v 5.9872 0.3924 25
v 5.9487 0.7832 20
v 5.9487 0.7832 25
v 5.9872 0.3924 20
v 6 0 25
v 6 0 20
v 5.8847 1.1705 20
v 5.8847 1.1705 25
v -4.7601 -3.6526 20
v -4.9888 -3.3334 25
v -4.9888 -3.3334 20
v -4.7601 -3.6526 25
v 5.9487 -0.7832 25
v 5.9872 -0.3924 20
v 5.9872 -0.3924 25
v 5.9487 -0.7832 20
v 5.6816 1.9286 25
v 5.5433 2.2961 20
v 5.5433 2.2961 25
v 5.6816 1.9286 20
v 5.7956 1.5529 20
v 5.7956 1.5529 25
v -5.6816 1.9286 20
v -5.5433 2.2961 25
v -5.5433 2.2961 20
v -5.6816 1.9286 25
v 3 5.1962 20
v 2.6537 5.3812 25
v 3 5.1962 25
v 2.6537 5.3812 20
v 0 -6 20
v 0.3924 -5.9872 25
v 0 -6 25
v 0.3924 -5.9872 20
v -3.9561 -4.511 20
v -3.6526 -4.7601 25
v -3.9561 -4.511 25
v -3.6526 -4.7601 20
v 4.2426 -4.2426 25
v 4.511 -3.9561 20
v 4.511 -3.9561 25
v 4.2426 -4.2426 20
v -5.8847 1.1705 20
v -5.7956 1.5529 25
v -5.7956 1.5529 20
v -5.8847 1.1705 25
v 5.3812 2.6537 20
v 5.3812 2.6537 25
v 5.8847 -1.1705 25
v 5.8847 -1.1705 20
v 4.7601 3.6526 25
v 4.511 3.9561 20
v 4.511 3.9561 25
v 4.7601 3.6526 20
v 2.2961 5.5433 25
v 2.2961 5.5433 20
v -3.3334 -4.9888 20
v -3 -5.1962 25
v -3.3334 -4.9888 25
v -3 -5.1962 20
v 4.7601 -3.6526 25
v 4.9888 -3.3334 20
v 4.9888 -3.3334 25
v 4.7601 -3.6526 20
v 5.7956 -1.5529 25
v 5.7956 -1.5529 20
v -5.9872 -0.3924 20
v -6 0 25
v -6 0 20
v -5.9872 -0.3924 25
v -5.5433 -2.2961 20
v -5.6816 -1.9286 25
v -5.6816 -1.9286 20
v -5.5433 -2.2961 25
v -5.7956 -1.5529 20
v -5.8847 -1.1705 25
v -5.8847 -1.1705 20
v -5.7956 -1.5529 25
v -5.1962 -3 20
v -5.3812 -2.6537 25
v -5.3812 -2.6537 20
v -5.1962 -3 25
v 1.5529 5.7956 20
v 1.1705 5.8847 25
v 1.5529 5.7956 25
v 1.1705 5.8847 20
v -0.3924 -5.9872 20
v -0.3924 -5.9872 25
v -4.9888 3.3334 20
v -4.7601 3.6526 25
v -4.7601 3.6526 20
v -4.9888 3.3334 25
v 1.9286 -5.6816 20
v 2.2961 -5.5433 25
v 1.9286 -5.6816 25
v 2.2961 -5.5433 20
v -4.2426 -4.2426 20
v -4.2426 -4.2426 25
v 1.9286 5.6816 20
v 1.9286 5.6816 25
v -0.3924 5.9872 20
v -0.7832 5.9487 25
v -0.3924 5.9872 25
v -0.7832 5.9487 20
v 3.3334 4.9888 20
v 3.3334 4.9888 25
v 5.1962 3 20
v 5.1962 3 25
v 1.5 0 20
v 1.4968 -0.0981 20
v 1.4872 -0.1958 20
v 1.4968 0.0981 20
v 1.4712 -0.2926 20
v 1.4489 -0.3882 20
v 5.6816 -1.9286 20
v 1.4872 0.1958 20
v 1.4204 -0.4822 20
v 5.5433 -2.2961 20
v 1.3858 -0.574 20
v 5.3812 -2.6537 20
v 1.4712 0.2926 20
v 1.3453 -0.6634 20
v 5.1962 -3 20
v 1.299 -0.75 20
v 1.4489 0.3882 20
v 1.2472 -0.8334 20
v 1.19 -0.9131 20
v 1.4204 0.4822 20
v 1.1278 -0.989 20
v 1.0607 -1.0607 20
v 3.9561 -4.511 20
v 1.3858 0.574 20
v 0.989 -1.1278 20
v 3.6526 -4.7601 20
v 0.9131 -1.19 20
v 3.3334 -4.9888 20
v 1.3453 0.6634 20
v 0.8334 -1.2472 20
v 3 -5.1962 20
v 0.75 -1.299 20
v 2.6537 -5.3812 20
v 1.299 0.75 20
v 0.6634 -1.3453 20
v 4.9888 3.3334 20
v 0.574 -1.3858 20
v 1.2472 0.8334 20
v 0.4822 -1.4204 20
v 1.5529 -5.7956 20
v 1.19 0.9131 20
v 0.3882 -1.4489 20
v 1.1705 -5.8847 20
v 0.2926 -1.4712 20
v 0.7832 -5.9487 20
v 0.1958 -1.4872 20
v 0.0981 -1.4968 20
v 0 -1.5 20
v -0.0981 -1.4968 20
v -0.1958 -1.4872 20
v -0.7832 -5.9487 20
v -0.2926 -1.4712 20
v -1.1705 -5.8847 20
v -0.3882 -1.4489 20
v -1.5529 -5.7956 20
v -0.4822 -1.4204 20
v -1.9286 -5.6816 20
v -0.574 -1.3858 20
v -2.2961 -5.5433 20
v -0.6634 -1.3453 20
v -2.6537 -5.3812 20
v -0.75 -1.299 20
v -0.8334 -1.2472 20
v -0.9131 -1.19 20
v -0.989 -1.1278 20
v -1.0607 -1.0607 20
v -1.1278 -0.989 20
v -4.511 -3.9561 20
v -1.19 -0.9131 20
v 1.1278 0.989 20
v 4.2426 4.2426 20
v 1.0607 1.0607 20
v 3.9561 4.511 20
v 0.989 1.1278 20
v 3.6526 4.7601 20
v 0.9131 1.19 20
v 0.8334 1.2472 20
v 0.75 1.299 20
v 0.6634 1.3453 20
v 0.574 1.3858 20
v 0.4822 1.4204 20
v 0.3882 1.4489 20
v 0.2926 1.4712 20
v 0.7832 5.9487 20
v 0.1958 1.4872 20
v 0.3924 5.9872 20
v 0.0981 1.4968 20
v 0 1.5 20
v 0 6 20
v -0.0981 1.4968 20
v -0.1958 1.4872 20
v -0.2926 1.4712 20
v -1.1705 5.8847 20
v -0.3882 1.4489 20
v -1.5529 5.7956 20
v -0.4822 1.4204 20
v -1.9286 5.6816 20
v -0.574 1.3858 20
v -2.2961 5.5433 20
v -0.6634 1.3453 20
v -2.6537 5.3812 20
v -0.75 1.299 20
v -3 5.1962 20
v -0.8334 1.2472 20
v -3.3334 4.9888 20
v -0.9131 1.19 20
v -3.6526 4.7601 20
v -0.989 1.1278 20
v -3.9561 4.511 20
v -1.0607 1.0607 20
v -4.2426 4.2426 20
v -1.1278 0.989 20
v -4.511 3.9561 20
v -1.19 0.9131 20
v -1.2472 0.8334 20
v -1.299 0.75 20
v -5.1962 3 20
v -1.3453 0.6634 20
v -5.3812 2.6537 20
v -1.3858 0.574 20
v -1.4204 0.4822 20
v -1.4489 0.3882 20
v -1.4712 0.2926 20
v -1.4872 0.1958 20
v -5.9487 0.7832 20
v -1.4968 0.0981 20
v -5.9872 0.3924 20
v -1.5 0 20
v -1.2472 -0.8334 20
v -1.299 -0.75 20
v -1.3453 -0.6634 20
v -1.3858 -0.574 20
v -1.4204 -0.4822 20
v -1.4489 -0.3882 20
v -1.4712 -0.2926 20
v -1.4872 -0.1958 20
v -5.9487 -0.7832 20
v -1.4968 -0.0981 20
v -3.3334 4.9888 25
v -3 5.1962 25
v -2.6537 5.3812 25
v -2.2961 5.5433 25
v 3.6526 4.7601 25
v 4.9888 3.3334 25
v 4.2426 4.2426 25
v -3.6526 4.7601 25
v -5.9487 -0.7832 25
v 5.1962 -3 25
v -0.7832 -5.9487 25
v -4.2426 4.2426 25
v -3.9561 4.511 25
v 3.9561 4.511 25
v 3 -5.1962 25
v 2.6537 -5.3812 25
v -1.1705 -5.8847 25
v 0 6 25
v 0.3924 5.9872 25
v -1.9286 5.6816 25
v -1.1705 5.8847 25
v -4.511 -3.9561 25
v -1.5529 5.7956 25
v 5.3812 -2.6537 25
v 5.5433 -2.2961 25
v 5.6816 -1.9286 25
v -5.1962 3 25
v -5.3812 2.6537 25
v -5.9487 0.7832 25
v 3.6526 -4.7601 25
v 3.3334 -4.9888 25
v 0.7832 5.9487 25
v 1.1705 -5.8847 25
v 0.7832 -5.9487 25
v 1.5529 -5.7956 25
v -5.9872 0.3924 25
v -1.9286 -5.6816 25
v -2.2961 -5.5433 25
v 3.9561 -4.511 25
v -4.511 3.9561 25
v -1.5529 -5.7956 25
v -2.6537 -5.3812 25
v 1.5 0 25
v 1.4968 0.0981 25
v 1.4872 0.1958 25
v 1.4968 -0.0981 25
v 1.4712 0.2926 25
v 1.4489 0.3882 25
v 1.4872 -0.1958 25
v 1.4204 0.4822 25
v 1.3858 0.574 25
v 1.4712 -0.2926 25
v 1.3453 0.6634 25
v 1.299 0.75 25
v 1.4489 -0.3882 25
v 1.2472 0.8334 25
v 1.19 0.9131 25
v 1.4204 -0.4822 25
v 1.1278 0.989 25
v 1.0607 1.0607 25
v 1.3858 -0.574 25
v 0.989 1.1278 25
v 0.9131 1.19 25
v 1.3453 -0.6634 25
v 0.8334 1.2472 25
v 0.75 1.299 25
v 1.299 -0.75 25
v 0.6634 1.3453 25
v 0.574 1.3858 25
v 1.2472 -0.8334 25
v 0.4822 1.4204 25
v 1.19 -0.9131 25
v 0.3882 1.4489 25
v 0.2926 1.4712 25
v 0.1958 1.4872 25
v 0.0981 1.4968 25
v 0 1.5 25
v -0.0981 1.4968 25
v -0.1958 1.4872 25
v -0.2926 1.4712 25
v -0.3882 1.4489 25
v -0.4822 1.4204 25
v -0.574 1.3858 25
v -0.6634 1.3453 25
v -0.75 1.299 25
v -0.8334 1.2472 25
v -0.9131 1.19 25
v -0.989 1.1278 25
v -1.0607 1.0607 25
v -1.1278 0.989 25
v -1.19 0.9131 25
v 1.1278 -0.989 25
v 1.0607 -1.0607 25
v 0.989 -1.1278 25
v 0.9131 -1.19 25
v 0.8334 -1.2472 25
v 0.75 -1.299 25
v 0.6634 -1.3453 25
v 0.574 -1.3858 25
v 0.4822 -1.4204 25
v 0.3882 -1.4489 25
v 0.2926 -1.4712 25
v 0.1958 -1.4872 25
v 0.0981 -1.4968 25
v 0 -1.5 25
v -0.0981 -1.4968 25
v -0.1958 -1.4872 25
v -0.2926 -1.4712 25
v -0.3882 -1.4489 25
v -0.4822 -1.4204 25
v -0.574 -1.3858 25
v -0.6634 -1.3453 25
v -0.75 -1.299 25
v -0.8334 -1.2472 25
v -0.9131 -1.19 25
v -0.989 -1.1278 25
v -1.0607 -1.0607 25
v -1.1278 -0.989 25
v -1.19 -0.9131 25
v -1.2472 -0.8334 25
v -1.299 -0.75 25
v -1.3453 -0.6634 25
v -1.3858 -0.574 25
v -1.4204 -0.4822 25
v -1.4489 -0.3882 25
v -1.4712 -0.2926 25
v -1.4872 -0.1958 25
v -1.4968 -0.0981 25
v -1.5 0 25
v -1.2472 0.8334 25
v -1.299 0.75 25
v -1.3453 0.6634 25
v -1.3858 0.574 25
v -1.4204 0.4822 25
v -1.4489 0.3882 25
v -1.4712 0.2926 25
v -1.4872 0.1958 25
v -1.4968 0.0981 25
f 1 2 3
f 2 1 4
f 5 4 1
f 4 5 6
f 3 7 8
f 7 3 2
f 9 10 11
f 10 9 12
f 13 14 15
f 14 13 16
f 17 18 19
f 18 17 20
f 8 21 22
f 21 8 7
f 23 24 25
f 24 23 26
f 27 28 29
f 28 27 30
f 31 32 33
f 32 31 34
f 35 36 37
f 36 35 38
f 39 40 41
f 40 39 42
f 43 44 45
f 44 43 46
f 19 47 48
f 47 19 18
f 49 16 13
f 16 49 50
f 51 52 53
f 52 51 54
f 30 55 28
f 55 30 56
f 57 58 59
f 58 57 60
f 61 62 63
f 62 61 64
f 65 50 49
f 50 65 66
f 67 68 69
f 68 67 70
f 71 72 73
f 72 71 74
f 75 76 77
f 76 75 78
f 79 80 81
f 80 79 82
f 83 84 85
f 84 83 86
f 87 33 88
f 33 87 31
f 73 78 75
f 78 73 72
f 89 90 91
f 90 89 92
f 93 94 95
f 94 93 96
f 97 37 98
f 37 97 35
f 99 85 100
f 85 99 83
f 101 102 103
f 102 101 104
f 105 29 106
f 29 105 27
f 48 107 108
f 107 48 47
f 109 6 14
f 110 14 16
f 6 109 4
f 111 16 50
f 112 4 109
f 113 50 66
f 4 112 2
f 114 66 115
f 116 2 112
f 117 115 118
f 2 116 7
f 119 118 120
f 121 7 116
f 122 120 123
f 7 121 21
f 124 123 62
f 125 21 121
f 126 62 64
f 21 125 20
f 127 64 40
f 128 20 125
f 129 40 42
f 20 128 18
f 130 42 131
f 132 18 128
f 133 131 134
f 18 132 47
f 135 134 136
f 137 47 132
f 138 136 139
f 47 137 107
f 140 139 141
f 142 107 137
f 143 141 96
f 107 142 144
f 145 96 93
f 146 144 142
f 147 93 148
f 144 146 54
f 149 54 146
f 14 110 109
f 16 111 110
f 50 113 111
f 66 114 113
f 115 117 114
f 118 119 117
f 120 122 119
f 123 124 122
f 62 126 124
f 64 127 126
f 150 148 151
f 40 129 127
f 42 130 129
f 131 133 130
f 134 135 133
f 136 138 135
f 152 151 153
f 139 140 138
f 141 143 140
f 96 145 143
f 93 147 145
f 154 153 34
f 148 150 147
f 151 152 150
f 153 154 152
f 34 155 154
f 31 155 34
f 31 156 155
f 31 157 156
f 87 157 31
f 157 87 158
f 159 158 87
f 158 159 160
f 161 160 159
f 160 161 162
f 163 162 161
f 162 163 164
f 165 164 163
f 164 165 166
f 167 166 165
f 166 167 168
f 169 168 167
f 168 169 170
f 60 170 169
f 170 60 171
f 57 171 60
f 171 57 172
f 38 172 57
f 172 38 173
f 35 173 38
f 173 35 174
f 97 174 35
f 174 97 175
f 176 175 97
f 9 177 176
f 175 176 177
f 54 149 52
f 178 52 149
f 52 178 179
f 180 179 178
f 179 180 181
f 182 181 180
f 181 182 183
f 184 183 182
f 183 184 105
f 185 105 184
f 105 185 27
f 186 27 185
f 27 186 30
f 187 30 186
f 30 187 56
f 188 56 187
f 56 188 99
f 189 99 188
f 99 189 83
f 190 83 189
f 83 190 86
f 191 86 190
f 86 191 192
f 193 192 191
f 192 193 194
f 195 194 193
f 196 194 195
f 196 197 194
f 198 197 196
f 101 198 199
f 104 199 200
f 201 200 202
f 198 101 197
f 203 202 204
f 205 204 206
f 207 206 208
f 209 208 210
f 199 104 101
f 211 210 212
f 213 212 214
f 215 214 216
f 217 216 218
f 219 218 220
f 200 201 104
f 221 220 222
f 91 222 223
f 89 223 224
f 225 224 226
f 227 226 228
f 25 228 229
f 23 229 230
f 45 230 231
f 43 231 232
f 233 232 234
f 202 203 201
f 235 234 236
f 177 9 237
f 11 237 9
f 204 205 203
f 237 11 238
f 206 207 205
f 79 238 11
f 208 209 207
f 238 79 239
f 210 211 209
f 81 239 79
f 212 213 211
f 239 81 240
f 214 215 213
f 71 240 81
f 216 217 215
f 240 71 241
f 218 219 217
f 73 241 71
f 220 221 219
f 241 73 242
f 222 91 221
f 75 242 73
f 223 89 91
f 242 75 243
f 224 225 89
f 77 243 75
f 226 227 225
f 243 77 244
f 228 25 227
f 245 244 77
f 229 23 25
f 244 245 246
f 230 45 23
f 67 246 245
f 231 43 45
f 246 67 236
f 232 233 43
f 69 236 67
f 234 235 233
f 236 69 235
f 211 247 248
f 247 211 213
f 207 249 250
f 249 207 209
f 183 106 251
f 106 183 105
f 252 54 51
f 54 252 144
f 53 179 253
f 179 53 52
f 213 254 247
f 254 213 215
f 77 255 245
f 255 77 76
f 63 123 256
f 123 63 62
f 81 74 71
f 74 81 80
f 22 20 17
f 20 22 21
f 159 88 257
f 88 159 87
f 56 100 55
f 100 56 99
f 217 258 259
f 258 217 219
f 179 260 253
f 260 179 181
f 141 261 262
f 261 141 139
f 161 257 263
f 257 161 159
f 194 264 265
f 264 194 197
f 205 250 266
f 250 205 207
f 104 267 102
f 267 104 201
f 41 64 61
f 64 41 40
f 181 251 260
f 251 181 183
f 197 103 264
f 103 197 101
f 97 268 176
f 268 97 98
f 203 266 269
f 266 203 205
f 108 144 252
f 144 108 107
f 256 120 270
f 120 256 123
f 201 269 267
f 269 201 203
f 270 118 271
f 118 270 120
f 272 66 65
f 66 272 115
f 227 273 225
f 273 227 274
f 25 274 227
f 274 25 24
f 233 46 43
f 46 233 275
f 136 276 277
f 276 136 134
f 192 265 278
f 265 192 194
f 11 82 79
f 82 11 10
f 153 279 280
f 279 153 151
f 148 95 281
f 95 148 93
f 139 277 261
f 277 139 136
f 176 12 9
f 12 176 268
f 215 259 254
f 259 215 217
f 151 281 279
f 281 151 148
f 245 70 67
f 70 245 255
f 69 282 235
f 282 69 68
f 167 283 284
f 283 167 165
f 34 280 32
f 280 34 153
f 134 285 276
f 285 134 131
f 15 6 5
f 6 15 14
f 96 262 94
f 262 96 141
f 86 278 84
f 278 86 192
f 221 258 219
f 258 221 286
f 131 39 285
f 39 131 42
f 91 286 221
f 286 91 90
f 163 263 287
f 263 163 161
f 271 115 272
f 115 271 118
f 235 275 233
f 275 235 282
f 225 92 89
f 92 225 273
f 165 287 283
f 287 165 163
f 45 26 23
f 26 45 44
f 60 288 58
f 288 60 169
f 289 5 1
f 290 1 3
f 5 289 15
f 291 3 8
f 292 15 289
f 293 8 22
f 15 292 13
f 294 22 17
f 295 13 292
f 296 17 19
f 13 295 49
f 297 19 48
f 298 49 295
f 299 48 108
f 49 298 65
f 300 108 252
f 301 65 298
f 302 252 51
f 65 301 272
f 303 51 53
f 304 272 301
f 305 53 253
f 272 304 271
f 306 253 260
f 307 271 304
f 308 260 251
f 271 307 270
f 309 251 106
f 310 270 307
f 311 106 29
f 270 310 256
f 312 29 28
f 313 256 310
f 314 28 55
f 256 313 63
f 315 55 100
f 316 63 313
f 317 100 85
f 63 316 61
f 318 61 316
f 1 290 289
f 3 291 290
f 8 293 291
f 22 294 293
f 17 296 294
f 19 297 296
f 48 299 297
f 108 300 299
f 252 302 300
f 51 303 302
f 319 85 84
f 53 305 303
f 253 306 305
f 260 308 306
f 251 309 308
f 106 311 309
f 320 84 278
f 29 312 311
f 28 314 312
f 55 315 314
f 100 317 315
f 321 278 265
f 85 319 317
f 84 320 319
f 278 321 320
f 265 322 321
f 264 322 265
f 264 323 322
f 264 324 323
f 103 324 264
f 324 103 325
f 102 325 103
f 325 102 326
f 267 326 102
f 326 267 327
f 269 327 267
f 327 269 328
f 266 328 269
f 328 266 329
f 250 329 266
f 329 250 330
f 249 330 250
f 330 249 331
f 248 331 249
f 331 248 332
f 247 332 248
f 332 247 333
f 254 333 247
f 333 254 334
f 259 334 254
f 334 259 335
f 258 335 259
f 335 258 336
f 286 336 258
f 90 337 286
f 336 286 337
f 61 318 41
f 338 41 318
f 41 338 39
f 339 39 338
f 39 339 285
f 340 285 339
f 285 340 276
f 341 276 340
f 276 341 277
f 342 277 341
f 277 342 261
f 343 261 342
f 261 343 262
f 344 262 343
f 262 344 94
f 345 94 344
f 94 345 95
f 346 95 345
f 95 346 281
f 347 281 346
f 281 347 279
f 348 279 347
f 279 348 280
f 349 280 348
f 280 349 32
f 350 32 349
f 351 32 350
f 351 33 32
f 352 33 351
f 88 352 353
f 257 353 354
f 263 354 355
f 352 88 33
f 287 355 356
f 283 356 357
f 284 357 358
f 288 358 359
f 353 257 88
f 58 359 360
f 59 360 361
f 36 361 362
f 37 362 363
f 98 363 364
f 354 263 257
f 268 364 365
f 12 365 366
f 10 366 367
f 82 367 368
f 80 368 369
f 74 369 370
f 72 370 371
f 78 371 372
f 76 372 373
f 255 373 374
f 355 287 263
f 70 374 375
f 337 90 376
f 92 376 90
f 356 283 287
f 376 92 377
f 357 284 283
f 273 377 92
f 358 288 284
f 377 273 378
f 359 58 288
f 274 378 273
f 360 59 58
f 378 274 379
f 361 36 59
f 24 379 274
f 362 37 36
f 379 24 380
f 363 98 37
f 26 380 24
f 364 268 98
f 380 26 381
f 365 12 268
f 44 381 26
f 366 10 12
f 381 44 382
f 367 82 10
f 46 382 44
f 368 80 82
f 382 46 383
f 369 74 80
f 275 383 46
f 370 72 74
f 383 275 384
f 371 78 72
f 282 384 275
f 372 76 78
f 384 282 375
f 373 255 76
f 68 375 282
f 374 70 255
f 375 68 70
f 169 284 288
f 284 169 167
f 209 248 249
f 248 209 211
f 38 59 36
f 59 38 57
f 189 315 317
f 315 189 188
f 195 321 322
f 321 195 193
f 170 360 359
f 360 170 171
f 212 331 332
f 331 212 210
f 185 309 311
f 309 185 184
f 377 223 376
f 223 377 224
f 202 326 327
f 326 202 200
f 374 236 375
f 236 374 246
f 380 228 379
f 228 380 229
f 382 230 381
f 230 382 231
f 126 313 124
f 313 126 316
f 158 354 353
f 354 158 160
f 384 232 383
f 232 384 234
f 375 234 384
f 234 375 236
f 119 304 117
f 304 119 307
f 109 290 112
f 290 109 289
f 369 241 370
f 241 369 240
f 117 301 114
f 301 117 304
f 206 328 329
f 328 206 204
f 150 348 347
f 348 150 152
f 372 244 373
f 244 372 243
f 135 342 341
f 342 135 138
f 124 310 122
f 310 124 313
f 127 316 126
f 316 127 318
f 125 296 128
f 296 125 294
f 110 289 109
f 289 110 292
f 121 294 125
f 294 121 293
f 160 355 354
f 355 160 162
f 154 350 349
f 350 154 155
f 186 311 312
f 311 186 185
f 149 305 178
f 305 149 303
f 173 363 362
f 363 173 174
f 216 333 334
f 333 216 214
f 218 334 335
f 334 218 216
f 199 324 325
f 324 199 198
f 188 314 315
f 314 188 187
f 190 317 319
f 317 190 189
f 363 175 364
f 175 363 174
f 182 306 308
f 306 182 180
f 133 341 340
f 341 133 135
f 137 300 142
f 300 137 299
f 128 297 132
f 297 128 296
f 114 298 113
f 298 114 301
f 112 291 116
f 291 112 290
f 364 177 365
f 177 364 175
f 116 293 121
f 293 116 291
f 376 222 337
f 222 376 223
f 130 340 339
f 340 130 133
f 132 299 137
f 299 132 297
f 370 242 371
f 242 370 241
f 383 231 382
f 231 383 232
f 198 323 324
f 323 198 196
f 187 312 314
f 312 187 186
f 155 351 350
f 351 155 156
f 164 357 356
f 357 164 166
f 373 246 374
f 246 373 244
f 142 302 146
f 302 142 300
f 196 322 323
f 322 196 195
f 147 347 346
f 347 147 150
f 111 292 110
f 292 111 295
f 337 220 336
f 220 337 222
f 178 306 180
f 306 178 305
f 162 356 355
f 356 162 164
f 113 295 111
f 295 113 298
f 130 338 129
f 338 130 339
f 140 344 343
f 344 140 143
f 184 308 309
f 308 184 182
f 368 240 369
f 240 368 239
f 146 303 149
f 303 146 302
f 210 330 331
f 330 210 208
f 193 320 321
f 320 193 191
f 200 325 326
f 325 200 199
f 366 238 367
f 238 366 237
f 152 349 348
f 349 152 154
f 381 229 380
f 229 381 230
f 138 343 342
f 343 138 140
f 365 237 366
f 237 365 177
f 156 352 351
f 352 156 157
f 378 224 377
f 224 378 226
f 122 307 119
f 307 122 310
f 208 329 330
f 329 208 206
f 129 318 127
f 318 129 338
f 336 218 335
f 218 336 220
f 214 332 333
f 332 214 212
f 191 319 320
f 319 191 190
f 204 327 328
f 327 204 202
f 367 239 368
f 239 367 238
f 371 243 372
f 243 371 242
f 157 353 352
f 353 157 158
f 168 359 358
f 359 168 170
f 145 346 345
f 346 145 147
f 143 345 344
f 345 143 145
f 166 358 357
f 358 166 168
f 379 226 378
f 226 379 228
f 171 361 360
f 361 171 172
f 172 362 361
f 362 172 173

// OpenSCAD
// Straight hose-barb reducer: 8 mm tubing (barbs) -> 5 mm tubing (barbs)
// Print orientation: standing upright along Z, centred on origin in X/Y

// ---------------- Parameters ----------------
bore       = 3;    // through-bore diameter (mm)
eps        = 0.5;  // cutter overshoot past faces (mm)

// Lower section (z = 0 .. 20): 8 mm tubing barbs
z_barb_a   = 20;   // height of lower barbs (mm)
outer_a    = [7.5, 9.5]; // outer diameter at bottom and top of barb (mm)
n_barb_a   = 2;    // number of barbs, stacked

// Collar (z = 20 .. 25)
z_collar   = 5;    // collar thickness (mm)
d_collar   = 12;   // collar outer diameter (mm)

// Upper section (z = 25 .. 41): 5 mm tubing barbs
z_barb_b   = 16;   // height of upper barbs (mm)
outer_b    = [6.5, 5.0]; // outer diameter at bottom and top of barb (mm)
n_barb_b   = 2;    // number of barbs, stacked

total_h    = z_barb_a + z_collar + z_barb_b; // = 41 mm

$fn = 96;          // curve resolution

// ---------------- Model ----------------
difference() {
    union() {
        // Lower barbs
        for (i = [0 : n_barb_a - 1])
            translate([0, 0, i * z_barb_a / n_barb_a])
                linear_extrude(height = z_barb_a / n_barb_a)
                    polygon(points = [
                        [-outer_a[0] / 2, 0],
                        [ outer_a[0] / 2, 0],
                        [ outer_a[1] / 2, 0],
                        [0, outer_a[1] / 2],
                        [0, -outer_a[1] / 2]
                    ]);

        // Collar
        translate([0, 0, z_barb_a])
            cylinder(h = z_collar, d = d_collar);

        // Upper barbs
        for (i = [0 : n_barb_b - 1])
            translate([0, 0, z_barb_a + z_collar + i * z_barb_b / n_barb_b])
                linear_extrude(height = z_barb_b / n_barb_b)
                    polygon(points = [
                        [-outer_b[0] / 2, 0],
                        [ outer_b[0] / 2, 0],
                        [ outer_b[1] / 2, 0],
                        [0, outer_b[1] / 2],
                        [0, -outer_b[1] / 2]
                    ]);
    }

    // Full-length through-bore
    translate([0, 0, -eps])
        cylinder(h = total_h + 2 * eps, d = bore);
}
